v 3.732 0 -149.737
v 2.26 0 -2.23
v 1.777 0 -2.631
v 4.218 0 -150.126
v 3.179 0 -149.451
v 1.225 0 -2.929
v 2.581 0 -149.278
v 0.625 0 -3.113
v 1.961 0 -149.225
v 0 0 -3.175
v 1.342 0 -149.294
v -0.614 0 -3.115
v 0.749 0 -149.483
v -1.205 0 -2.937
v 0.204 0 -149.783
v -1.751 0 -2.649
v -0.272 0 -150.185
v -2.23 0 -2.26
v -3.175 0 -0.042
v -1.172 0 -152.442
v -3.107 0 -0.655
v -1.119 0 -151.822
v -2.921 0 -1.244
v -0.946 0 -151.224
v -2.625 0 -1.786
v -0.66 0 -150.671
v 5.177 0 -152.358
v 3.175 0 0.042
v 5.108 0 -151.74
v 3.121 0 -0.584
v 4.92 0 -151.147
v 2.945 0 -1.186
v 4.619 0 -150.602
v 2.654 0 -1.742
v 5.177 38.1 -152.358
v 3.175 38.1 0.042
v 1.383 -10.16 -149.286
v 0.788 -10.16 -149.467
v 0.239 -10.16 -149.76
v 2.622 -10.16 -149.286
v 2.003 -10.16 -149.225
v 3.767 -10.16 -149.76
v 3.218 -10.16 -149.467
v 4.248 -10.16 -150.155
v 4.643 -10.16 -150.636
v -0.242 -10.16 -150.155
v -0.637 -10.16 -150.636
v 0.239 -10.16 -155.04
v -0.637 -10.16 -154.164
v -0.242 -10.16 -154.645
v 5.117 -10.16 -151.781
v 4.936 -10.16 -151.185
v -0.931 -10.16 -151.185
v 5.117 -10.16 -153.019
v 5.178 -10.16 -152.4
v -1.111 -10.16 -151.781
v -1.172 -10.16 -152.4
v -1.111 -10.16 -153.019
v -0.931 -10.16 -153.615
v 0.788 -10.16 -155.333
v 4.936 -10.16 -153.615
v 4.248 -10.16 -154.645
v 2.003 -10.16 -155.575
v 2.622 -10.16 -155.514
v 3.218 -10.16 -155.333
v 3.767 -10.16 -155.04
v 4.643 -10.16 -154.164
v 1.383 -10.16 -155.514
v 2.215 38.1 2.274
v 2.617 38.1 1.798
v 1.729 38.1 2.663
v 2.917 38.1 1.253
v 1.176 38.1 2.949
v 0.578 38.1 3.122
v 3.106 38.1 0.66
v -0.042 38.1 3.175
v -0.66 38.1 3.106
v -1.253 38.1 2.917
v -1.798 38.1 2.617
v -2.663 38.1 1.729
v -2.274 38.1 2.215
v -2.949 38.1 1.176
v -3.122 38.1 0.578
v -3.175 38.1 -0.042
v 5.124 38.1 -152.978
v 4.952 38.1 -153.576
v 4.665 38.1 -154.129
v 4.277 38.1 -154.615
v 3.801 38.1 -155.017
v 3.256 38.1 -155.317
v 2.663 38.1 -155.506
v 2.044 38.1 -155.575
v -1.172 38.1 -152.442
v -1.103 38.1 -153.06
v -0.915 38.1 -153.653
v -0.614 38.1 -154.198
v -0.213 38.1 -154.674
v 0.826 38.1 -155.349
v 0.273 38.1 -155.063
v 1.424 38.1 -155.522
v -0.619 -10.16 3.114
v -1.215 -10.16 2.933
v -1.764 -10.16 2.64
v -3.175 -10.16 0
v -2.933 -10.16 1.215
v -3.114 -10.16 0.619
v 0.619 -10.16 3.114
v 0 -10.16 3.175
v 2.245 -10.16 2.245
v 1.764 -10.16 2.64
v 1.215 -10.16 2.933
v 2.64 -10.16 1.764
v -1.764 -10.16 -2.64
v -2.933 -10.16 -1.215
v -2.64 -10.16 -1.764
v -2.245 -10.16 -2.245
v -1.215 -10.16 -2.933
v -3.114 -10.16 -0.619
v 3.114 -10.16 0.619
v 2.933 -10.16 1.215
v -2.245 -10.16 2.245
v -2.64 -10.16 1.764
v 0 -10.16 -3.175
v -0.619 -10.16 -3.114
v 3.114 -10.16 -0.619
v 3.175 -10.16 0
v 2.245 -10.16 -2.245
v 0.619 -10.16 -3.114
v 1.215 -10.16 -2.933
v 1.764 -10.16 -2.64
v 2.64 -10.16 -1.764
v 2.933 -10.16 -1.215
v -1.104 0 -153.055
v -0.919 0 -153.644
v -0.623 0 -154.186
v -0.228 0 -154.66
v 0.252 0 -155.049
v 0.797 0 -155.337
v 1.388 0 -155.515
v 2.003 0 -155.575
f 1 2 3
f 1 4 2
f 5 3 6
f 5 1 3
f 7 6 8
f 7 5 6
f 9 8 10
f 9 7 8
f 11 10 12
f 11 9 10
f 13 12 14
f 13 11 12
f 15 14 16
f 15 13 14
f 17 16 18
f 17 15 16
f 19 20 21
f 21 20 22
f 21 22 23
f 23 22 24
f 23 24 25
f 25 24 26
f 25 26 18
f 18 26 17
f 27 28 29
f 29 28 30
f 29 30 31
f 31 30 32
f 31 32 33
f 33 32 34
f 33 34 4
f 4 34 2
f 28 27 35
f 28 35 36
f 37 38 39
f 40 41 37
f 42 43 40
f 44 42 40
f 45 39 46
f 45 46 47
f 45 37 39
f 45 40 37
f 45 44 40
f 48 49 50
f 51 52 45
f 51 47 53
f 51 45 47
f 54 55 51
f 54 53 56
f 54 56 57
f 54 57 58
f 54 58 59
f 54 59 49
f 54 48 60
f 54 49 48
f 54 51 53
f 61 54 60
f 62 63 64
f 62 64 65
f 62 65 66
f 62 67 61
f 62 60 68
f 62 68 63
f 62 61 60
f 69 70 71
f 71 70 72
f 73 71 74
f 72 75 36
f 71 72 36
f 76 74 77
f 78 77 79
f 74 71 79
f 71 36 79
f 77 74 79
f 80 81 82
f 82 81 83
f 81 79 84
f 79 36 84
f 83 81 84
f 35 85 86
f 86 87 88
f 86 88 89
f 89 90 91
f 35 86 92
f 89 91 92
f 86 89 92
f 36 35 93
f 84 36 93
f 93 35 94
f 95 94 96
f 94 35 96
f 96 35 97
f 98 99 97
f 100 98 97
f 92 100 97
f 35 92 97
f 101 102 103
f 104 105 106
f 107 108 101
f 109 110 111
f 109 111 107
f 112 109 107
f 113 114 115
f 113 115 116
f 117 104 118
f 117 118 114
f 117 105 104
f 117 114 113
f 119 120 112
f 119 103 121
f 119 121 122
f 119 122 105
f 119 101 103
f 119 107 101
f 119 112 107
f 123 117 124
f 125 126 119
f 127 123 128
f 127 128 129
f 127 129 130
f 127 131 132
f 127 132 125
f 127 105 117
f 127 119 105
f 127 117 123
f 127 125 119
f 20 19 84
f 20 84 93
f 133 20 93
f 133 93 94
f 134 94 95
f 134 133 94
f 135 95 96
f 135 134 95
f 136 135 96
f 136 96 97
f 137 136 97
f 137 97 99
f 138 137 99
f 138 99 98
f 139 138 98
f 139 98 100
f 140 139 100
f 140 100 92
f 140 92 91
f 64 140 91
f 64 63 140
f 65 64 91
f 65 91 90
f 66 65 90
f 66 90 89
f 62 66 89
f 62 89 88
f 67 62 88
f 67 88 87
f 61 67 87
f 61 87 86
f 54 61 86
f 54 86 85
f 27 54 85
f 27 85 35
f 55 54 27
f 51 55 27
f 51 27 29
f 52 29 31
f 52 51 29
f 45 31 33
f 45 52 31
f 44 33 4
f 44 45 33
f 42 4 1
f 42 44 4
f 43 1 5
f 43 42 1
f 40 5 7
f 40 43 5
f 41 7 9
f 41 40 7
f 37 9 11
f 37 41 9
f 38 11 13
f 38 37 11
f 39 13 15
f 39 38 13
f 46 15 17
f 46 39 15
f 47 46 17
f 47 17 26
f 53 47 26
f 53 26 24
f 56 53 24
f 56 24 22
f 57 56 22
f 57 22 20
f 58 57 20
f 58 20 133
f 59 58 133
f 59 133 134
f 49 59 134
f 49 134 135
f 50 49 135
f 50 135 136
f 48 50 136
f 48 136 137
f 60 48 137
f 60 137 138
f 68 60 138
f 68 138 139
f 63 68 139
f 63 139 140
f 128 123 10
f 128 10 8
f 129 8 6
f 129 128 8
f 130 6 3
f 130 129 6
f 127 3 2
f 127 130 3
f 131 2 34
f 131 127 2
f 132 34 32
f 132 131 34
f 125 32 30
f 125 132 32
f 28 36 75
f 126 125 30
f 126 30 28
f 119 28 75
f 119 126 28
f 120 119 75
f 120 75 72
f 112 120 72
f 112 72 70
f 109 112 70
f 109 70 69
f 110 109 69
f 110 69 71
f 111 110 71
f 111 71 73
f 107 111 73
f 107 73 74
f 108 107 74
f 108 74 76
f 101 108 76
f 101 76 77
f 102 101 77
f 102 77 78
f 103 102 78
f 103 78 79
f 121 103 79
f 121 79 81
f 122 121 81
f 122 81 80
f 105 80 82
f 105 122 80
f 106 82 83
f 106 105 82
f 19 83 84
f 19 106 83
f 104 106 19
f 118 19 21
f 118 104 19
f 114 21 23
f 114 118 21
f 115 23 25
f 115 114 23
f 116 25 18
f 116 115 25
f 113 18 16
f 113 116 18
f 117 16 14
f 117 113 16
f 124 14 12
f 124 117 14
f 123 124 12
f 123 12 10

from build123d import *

# Parameters (mm, degrees)
BOSS_EXTRUDE1_DEPTH = 38.1
BOSS_EXTRUDE2_START = 10.16
SKETCH2_R           = 3.175
BOSS_EXTRUDE2_DEPTH = 10.16


with BuildPart() as part:
    # Sketch1 → Boss-Extrude1 (new body)
    with BuildSketch(Plane(origin=(0, 0, 0), x_dir=(1, 0, 0), z_dir=(0, 1, 0))):
        with BuildLine():
            Line((-3.174725922, 0.04171715), (-1.172129839, 152.44171715))
            ThreePointArc((-1.172129839, 152.44171715), (2.044313233, 155.574725922), (5.177322005, 152.35828285))
            Line((5.177322005, 152.35828285), (3.174725922, -0.04171715))
            ThreePointArc((3.174725922, -0.04171715), (-0.04171715, -3.174725922), (-3.174725922, 0.04171715))
        make_face()
    extrude(amount=BOSS_EXTRUDE1_DEPTH)

    # Sketch2 → Boss-Extrude2 (add)
    with BuildSketch(Plane(origin=(0, 0, 0), x_dir=(-1, 0, 0), z_dir=(0, -1, 0)).offset(BOSS_EXTRUDE2_START)):
        with Locations(Location((-2.002596083, 152.4, 0), (0, 0, 90))):
            Circle(SKETCH2_R)
        with Locations(Location((0, 0, 0), (0, 0, 90))):
            Circle(SKETCH2_R)
    extrude(amount=-BOSS_EXTRUDE2_DEPTH)


solid = part.part
